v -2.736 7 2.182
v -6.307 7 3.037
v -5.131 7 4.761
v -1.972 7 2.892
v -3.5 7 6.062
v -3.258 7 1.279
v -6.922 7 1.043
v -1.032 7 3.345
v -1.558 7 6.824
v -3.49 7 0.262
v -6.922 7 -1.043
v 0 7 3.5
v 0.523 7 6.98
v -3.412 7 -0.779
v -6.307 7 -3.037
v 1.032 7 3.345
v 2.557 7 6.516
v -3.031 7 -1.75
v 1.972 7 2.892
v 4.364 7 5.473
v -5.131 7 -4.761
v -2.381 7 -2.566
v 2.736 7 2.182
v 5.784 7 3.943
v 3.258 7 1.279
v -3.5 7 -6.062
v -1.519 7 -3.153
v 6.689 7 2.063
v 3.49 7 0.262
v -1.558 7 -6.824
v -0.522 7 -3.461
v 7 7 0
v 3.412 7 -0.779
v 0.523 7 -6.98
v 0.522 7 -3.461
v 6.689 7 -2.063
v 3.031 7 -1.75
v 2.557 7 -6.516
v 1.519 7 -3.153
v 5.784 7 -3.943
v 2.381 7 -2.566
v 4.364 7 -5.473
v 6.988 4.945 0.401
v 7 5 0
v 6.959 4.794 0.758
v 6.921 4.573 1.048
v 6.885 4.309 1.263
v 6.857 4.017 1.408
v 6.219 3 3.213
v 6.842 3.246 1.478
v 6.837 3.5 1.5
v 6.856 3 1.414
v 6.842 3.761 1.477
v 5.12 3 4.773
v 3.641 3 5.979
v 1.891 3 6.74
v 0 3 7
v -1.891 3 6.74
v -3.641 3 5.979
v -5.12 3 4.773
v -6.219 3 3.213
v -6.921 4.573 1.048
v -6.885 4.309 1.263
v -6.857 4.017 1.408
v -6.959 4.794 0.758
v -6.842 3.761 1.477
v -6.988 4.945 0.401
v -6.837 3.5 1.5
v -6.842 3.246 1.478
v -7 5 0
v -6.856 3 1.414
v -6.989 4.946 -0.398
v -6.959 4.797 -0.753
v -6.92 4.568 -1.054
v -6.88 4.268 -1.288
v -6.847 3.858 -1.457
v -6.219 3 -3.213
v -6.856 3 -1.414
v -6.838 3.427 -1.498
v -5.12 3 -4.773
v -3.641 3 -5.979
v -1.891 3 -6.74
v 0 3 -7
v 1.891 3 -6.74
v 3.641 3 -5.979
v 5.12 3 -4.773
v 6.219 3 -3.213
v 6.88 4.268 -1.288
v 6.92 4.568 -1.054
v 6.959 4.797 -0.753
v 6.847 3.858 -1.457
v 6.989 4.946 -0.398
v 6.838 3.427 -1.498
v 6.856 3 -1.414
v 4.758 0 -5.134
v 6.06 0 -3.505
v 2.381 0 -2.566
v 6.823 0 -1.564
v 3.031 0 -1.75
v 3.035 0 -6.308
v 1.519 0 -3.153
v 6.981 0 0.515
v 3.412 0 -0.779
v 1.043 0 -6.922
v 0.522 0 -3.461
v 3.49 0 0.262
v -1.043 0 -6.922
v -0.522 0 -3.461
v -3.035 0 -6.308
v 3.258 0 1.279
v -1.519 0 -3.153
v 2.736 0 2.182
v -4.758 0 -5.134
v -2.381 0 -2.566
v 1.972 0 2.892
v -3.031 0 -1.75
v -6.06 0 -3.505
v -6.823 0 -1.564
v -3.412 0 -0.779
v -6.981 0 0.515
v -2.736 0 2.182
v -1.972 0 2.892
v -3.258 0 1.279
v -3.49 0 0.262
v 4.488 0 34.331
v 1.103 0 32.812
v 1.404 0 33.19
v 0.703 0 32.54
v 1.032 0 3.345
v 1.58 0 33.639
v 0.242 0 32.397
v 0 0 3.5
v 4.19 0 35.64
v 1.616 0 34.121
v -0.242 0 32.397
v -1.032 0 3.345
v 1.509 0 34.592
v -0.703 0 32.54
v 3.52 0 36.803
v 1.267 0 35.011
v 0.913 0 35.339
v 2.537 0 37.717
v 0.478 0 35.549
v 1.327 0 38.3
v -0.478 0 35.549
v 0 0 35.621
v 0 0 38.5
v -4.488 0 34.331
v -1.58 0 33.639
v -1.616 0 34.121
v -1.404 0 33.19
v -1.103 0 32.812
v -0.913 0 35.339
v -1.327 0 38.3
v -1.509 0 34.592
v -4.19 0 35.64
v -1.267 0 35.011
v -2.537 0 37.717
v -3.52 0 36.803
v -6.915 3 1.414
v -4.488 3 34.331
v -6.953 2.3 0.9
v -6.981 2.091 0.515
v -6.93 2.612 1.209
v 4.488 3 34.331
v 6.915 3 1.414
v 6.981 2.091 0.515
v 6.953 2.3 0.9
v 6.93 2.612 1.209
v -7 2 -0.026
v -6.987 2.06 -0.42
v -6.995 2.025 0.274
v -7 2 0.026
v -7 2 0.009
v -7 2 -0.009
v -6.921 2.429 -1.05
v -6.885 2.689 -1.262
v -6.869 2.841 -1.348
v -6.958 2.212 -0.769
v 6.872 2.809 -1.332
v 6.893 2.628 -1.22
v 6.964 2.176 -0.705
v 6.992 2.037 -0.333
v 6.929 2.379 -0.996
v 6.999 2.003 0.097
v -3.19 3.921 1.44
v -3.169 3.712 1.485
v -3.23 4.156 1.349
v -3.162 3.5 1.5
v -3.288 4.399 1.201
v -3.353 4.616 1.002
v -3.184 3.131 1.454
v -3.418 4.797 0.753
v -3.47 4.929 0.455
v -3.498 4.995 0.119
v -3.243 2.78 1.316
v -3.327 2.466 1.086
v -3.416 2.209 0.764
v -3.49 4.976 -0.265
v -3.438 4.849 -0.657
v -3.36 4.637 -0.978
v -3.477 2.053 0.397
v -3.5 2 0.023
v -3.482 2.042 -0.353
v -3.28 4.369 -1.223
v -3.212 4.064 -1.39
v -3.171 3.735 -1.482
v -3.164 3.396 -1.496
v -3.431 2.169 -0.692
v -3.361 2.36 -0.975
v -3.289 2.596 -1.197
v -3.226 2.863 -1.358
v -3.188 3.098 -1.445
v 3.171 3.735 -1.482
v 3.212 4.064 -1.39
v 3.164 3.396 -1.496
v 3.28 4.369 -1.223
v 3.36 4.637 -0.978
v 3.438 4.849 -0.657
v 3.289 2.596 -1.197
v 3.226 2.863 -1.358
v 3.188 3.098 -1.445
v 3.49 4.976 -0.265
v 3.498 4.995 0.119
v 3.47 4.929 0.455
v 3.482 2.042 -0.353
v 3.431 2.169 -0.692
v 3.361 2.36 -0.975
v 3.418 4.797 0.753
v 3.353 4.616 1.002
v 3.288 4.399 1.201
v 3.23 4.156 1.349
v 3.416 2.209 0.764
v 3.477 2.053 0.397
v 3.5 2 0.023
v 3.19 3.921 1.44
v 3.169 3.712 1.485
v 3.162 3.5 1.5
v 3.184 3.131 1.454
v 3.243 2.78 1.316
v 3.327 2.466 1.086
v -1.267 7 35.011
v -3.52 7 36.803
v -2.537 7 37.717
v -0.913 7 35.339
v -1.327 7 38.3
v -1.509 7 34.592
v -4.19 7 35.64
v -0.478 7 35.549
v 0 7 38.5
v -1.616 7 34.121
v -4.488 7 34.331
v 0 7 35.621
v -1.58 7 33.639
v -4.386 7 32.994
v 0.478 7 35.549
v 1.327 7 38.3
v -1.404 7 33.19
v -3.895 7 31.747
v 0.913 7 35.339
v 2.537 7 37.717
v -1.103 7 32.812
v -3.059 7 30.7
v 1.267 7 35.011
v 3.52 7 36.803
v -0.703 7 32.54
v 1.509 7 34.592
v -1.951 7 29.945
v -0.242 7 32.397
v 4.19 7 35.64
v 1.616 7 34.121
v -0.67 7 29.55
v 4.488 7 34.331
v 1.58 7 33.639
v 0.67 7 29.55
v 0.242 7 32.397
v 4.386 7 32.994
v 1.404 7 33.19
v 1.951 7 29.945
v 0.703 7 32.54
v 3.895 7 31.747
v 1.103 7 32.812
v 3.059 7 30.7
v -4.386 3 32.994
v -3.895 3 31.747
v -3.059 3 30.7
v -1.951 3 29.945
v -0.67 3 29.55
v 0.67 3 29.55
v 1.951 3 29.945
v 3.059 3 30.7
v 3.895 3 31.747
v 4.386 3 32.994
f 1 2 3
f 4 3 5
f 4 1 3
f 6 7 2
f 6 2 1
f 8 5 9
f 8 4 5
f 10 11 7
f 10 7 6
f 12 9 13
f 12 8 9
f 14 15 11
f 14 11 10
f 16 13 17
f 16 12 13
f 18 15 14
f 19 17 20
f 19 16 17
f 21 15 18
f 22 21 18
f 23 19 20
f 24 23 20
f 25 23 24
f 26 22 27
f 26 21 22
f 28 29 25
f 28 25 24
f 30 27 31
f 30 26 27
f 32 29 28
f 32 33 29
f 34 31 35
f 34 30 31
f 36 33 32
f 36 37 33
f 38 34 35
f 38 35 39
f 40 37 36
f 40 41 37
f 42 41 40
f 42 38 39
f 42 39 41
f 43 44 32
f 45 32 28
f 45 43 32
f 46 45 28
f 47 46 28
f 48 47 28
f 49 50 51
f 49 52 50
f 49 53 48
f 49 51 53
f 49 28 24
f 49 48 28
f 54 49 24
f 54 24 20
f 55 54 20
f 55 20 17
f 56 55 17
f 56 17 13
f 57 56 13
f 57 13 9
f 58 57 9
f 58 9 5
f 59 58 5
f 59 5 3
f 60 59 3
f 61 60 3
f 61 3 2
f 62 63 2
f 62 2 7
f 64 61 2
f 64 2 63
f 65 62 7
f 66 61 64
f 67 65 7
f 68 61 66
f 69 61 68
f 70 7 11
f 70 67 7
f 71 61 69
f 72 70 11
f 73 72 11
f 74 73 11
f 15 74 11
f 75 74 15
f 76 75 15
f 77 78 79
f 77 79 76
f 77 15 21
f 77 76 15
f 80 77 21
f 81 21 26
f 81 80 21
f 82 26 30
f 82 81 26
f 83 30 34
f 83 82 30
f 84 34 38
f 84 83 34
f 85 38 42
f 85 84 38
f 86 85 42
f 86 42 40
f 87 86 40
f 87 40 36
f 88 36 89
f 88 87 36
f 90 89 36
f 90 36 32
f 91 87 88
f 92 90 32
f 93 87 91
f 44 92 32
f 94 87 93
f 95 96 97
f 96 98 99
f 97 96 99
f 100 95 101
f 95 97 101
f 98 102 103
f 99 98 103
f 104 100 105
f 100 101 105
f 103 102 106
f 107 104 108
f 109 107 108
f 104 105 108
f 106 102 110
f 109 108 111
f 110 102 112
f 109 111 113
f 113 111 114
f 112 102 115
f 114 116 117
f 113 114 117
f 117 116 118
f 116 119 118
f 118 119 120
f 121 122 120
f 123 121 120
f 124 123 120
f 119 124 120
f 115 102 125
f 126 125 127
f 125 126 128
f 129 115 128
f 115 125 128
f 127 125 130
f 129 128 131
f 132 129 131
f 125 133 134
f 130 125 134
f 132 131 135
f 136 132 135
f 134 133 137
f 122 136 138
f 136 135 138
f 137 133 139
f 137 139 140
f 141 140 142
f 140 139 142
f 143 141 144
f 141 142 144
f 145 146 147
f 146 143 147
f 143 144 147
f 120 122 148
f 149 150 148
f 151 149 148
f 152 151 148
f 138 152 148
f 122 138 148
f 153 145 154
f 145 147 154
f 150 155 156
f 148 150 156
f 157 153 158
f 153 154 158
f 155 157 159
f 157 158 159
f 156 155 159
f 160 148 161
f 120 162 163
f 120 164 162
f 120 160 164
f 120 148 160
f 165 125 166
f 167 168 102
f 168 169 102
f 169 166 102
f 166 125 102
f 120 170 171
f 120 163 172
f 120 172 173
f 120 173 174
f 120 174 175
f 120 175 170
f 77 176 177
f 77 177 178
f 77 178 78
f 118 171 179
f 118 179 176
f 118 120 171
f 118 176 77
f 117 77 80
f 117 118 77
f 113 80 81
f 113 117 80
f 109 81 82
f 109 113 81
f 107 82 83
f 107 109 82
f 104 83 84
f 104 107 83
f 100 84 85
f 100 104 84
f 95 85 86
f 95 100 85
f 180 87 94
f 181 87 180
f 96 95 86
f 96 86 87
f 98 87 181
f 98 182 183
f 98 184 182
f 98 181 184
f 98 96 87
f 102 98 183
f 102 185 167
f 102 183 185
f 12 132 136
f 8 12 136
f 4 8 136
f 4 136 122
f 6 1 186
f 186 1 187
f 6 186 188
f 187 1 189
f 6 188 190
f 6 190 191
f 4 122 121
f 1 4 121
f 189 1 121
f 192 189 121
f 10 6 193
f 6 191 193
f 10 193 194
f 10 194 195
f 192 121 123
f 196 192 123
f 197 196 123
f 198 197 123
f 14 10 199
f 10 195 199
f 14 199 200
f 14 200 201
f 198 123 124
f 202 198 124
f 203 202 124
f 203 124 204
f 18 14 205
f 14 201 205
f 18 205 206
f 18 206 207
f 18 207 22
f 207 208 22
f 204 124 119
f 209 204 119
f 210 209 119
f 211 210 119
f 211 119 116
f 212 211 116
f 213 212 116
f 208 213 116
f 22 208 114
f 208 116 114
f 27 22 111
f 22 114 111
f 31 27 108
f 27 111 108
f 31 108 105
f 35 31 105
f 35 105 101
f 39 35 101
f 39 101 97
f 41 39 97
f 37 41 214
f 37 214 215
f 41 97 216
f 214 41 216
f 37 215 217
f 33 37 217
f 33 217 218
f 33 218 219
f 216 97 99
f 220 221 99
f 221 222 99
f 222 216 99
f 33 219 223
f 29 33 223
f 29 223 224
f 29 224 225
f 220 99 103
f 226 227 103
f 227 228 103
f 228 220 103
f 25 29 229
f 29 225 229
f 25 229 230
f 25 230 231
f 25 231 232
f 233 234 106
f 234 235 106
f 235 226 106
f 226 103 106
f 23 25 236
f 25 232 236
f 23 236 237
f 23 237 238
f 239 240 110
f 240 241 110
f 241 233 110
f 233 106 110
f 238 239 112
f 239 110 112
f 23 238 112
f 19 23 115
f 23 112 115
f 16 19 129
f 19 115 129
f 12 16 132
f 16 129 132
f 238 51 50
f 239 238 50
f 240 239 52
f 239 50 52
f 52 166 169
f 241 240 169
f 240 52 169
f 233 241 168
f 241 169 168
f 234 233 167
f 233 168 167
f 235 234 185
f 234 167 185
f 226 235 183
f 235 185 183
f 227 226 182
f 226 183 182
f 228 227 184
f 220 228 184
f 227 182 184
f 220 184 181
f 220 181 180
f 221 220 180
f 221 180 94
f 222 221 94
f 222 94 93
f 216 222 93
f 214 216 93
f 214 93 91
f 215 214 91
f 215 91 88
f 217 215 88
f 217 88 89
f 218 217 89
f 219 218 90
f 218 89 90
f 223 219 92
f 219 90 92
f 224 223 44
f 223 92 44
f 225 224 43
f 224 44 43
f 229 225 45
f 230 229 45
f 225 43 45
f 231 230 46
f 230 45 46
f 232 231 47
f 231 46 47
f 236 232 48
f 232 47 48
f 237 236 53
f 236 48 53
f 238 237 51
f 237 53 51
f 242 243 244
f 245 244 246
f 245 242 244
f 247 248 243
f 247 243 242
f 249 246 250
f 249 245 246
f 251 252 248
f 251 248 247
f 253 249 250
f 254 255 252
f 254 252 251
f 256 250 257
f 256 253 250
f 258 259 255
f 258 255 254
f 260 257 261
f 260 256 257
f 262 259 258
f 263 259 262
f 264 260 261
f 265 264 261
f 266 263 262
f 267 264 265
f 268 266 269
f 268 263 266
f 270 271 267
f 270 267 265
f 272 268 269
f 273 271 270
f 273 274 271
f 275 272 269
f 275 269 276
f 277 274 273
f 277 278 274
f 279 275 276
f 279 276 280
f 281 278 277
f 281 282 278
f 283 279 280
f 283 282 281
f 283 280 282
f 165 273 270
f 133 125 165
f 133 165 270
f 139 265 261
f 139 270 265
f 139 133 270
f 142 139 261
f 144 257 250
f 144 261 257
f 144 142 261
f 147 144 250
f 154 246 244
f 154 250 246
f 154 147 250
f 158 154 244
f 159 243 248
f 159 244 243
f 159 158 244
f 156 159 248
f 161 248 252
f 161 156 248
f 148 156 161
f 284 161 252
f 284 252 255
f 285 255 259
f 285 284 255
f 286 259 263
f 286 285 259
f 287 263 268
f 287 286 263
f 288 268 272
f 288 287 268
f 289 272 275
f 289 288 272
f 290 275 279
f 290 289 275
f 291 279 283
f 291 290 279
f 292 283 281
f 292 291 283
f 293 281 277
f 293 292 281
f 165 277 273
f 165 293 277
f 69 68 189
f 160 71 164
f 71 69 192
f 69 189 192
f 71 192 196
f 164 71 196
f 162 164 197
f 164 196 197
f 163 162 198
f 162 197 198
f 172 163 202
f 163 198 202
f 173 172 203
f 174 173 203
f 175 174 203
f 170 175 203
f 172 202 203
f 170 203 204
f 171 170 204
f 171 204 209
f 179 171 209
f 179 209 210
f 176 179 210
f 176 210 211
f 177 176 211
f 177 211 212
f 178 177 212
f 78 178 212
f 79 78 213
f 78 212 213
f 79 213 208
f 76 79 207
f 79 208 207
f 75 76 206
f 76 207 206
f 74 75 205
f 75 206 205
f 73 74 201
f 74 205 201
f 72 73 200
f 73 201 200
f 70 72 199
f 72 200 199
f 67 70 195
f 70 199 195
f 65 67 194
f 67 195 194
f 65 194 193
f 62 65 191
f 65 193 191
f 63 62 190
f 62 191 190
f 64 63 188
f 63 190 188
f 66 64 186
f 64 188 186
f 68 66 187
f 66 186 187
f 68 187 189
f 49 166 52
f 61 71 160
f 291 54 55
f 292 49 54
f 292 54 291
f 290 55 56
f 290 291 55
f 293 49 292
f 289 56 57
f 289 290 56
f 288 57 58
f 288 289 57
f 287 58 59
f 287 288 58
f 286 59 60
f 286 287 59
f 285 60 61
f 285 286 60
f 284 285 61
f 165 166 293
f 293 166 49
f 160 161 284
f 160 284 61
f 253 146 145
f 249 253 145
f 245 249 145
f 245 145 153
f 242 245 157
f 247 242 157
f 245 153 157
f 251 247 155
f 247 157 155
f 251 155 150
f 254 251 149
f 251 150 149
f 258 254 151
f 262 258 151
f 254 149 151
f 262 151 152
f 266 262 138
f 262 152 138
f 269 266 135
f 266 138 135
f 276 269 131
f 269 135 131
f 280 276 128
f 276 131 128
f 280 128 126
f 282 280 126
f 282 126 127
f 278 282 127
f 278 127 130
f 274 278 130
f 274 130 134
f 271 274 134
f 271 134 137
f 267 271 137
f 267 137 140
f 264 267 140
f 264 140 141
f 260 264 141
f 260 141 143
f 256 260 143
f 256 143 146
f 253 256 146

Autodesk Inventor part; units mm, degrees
ref_plane "XZ Plane" through (0, 0, 0) normal (0, 1, 0) x (-1, 0, 0)
ref_plane "XY Plane" through (0, 0, 0) normal (0, 0, 1) x (1, 0, 0)
sketch "Skizze1" plane through (0, 0, 0) normal (0, 1, 0) x (-1, 0, 0)
  arc A0 (4.4878, 34.3309) -> (-4.4878, 34.3309) centre (0, 34) ccw
  arc A1 (-6.9811, 0.5147) -> (6.9811, 0.5147) centre (0, 0) ccw
  line L0 (4.4878, 34.3309) -> (6.9811, 0.5147)
  line L1 (-4.4878, 34.3309) -> (-6.9811, 0.5147)
  line L2 (0, 34) -> (0, 0) construction
  dimension "d0" = 34
  dimension "d1" = 14
  dimension "d2" = 9
extrude "Extrusion1" add sketch "Skizze1" along normal blind 3
sketch "Skizze2" plane through (0, 3, 0) normal (0, 1, 0) x (1, 0, 0)
  circle A0 centre (0, -34) radius 4.5
  arc A1 (-4.4878, -34.3309) -> (4.4878, -34.3309) centre (0, -34) ccw projected
  circle A2 centre (0, 0) radius 7
  arc A3 (6.9811, -0.5147) -> (-6.9811, -0.5147) centre (0, 0) ccw projected
  dimension "d5" = 9
  dimension "d6" = 14
extrude "Extrusion2" add sketch "Skizze2" along normal blind 4
sketch "Skizze3" plane through (0, 7, 34) normal (0, 1, 0) x (1, 0, 0)
  circle A0 centre (0, 0) radius 4.5 projected
  point P0 (0, 34)
hole "Bohrung1" at (0, 7, 34) direction (0, -1, 0) diameter 3.242 depth 7 thread size "M4x0.7" class "6H" standard "ISO Metric profile"
hole "Bohrung2" at (0, 7, 0) direction (0, -1, 0) diameter 7 depth 7
ref_plane "Arbeitsebene1" through (-7, 0, 0) normal (1, 0, 0) x (0, 1, 0)
sketch "Skizze4" plane through (-7, 0, 0) normal (1, 0, 0) x (0, 1, 0)
  line L0 (0, 0.5147) -> (0, 34.3309) projected
  line L1 (0, -7) -> (7, -7) projected
  point P0 (0, 0)
  point P1 (3.5, 0)
  dimension "d24" = 3.5
hole "Bohrung3" at (-7, 3.5, 0) direction (1, 0, 0) diameter 3 end through all
properties part number "2072"
